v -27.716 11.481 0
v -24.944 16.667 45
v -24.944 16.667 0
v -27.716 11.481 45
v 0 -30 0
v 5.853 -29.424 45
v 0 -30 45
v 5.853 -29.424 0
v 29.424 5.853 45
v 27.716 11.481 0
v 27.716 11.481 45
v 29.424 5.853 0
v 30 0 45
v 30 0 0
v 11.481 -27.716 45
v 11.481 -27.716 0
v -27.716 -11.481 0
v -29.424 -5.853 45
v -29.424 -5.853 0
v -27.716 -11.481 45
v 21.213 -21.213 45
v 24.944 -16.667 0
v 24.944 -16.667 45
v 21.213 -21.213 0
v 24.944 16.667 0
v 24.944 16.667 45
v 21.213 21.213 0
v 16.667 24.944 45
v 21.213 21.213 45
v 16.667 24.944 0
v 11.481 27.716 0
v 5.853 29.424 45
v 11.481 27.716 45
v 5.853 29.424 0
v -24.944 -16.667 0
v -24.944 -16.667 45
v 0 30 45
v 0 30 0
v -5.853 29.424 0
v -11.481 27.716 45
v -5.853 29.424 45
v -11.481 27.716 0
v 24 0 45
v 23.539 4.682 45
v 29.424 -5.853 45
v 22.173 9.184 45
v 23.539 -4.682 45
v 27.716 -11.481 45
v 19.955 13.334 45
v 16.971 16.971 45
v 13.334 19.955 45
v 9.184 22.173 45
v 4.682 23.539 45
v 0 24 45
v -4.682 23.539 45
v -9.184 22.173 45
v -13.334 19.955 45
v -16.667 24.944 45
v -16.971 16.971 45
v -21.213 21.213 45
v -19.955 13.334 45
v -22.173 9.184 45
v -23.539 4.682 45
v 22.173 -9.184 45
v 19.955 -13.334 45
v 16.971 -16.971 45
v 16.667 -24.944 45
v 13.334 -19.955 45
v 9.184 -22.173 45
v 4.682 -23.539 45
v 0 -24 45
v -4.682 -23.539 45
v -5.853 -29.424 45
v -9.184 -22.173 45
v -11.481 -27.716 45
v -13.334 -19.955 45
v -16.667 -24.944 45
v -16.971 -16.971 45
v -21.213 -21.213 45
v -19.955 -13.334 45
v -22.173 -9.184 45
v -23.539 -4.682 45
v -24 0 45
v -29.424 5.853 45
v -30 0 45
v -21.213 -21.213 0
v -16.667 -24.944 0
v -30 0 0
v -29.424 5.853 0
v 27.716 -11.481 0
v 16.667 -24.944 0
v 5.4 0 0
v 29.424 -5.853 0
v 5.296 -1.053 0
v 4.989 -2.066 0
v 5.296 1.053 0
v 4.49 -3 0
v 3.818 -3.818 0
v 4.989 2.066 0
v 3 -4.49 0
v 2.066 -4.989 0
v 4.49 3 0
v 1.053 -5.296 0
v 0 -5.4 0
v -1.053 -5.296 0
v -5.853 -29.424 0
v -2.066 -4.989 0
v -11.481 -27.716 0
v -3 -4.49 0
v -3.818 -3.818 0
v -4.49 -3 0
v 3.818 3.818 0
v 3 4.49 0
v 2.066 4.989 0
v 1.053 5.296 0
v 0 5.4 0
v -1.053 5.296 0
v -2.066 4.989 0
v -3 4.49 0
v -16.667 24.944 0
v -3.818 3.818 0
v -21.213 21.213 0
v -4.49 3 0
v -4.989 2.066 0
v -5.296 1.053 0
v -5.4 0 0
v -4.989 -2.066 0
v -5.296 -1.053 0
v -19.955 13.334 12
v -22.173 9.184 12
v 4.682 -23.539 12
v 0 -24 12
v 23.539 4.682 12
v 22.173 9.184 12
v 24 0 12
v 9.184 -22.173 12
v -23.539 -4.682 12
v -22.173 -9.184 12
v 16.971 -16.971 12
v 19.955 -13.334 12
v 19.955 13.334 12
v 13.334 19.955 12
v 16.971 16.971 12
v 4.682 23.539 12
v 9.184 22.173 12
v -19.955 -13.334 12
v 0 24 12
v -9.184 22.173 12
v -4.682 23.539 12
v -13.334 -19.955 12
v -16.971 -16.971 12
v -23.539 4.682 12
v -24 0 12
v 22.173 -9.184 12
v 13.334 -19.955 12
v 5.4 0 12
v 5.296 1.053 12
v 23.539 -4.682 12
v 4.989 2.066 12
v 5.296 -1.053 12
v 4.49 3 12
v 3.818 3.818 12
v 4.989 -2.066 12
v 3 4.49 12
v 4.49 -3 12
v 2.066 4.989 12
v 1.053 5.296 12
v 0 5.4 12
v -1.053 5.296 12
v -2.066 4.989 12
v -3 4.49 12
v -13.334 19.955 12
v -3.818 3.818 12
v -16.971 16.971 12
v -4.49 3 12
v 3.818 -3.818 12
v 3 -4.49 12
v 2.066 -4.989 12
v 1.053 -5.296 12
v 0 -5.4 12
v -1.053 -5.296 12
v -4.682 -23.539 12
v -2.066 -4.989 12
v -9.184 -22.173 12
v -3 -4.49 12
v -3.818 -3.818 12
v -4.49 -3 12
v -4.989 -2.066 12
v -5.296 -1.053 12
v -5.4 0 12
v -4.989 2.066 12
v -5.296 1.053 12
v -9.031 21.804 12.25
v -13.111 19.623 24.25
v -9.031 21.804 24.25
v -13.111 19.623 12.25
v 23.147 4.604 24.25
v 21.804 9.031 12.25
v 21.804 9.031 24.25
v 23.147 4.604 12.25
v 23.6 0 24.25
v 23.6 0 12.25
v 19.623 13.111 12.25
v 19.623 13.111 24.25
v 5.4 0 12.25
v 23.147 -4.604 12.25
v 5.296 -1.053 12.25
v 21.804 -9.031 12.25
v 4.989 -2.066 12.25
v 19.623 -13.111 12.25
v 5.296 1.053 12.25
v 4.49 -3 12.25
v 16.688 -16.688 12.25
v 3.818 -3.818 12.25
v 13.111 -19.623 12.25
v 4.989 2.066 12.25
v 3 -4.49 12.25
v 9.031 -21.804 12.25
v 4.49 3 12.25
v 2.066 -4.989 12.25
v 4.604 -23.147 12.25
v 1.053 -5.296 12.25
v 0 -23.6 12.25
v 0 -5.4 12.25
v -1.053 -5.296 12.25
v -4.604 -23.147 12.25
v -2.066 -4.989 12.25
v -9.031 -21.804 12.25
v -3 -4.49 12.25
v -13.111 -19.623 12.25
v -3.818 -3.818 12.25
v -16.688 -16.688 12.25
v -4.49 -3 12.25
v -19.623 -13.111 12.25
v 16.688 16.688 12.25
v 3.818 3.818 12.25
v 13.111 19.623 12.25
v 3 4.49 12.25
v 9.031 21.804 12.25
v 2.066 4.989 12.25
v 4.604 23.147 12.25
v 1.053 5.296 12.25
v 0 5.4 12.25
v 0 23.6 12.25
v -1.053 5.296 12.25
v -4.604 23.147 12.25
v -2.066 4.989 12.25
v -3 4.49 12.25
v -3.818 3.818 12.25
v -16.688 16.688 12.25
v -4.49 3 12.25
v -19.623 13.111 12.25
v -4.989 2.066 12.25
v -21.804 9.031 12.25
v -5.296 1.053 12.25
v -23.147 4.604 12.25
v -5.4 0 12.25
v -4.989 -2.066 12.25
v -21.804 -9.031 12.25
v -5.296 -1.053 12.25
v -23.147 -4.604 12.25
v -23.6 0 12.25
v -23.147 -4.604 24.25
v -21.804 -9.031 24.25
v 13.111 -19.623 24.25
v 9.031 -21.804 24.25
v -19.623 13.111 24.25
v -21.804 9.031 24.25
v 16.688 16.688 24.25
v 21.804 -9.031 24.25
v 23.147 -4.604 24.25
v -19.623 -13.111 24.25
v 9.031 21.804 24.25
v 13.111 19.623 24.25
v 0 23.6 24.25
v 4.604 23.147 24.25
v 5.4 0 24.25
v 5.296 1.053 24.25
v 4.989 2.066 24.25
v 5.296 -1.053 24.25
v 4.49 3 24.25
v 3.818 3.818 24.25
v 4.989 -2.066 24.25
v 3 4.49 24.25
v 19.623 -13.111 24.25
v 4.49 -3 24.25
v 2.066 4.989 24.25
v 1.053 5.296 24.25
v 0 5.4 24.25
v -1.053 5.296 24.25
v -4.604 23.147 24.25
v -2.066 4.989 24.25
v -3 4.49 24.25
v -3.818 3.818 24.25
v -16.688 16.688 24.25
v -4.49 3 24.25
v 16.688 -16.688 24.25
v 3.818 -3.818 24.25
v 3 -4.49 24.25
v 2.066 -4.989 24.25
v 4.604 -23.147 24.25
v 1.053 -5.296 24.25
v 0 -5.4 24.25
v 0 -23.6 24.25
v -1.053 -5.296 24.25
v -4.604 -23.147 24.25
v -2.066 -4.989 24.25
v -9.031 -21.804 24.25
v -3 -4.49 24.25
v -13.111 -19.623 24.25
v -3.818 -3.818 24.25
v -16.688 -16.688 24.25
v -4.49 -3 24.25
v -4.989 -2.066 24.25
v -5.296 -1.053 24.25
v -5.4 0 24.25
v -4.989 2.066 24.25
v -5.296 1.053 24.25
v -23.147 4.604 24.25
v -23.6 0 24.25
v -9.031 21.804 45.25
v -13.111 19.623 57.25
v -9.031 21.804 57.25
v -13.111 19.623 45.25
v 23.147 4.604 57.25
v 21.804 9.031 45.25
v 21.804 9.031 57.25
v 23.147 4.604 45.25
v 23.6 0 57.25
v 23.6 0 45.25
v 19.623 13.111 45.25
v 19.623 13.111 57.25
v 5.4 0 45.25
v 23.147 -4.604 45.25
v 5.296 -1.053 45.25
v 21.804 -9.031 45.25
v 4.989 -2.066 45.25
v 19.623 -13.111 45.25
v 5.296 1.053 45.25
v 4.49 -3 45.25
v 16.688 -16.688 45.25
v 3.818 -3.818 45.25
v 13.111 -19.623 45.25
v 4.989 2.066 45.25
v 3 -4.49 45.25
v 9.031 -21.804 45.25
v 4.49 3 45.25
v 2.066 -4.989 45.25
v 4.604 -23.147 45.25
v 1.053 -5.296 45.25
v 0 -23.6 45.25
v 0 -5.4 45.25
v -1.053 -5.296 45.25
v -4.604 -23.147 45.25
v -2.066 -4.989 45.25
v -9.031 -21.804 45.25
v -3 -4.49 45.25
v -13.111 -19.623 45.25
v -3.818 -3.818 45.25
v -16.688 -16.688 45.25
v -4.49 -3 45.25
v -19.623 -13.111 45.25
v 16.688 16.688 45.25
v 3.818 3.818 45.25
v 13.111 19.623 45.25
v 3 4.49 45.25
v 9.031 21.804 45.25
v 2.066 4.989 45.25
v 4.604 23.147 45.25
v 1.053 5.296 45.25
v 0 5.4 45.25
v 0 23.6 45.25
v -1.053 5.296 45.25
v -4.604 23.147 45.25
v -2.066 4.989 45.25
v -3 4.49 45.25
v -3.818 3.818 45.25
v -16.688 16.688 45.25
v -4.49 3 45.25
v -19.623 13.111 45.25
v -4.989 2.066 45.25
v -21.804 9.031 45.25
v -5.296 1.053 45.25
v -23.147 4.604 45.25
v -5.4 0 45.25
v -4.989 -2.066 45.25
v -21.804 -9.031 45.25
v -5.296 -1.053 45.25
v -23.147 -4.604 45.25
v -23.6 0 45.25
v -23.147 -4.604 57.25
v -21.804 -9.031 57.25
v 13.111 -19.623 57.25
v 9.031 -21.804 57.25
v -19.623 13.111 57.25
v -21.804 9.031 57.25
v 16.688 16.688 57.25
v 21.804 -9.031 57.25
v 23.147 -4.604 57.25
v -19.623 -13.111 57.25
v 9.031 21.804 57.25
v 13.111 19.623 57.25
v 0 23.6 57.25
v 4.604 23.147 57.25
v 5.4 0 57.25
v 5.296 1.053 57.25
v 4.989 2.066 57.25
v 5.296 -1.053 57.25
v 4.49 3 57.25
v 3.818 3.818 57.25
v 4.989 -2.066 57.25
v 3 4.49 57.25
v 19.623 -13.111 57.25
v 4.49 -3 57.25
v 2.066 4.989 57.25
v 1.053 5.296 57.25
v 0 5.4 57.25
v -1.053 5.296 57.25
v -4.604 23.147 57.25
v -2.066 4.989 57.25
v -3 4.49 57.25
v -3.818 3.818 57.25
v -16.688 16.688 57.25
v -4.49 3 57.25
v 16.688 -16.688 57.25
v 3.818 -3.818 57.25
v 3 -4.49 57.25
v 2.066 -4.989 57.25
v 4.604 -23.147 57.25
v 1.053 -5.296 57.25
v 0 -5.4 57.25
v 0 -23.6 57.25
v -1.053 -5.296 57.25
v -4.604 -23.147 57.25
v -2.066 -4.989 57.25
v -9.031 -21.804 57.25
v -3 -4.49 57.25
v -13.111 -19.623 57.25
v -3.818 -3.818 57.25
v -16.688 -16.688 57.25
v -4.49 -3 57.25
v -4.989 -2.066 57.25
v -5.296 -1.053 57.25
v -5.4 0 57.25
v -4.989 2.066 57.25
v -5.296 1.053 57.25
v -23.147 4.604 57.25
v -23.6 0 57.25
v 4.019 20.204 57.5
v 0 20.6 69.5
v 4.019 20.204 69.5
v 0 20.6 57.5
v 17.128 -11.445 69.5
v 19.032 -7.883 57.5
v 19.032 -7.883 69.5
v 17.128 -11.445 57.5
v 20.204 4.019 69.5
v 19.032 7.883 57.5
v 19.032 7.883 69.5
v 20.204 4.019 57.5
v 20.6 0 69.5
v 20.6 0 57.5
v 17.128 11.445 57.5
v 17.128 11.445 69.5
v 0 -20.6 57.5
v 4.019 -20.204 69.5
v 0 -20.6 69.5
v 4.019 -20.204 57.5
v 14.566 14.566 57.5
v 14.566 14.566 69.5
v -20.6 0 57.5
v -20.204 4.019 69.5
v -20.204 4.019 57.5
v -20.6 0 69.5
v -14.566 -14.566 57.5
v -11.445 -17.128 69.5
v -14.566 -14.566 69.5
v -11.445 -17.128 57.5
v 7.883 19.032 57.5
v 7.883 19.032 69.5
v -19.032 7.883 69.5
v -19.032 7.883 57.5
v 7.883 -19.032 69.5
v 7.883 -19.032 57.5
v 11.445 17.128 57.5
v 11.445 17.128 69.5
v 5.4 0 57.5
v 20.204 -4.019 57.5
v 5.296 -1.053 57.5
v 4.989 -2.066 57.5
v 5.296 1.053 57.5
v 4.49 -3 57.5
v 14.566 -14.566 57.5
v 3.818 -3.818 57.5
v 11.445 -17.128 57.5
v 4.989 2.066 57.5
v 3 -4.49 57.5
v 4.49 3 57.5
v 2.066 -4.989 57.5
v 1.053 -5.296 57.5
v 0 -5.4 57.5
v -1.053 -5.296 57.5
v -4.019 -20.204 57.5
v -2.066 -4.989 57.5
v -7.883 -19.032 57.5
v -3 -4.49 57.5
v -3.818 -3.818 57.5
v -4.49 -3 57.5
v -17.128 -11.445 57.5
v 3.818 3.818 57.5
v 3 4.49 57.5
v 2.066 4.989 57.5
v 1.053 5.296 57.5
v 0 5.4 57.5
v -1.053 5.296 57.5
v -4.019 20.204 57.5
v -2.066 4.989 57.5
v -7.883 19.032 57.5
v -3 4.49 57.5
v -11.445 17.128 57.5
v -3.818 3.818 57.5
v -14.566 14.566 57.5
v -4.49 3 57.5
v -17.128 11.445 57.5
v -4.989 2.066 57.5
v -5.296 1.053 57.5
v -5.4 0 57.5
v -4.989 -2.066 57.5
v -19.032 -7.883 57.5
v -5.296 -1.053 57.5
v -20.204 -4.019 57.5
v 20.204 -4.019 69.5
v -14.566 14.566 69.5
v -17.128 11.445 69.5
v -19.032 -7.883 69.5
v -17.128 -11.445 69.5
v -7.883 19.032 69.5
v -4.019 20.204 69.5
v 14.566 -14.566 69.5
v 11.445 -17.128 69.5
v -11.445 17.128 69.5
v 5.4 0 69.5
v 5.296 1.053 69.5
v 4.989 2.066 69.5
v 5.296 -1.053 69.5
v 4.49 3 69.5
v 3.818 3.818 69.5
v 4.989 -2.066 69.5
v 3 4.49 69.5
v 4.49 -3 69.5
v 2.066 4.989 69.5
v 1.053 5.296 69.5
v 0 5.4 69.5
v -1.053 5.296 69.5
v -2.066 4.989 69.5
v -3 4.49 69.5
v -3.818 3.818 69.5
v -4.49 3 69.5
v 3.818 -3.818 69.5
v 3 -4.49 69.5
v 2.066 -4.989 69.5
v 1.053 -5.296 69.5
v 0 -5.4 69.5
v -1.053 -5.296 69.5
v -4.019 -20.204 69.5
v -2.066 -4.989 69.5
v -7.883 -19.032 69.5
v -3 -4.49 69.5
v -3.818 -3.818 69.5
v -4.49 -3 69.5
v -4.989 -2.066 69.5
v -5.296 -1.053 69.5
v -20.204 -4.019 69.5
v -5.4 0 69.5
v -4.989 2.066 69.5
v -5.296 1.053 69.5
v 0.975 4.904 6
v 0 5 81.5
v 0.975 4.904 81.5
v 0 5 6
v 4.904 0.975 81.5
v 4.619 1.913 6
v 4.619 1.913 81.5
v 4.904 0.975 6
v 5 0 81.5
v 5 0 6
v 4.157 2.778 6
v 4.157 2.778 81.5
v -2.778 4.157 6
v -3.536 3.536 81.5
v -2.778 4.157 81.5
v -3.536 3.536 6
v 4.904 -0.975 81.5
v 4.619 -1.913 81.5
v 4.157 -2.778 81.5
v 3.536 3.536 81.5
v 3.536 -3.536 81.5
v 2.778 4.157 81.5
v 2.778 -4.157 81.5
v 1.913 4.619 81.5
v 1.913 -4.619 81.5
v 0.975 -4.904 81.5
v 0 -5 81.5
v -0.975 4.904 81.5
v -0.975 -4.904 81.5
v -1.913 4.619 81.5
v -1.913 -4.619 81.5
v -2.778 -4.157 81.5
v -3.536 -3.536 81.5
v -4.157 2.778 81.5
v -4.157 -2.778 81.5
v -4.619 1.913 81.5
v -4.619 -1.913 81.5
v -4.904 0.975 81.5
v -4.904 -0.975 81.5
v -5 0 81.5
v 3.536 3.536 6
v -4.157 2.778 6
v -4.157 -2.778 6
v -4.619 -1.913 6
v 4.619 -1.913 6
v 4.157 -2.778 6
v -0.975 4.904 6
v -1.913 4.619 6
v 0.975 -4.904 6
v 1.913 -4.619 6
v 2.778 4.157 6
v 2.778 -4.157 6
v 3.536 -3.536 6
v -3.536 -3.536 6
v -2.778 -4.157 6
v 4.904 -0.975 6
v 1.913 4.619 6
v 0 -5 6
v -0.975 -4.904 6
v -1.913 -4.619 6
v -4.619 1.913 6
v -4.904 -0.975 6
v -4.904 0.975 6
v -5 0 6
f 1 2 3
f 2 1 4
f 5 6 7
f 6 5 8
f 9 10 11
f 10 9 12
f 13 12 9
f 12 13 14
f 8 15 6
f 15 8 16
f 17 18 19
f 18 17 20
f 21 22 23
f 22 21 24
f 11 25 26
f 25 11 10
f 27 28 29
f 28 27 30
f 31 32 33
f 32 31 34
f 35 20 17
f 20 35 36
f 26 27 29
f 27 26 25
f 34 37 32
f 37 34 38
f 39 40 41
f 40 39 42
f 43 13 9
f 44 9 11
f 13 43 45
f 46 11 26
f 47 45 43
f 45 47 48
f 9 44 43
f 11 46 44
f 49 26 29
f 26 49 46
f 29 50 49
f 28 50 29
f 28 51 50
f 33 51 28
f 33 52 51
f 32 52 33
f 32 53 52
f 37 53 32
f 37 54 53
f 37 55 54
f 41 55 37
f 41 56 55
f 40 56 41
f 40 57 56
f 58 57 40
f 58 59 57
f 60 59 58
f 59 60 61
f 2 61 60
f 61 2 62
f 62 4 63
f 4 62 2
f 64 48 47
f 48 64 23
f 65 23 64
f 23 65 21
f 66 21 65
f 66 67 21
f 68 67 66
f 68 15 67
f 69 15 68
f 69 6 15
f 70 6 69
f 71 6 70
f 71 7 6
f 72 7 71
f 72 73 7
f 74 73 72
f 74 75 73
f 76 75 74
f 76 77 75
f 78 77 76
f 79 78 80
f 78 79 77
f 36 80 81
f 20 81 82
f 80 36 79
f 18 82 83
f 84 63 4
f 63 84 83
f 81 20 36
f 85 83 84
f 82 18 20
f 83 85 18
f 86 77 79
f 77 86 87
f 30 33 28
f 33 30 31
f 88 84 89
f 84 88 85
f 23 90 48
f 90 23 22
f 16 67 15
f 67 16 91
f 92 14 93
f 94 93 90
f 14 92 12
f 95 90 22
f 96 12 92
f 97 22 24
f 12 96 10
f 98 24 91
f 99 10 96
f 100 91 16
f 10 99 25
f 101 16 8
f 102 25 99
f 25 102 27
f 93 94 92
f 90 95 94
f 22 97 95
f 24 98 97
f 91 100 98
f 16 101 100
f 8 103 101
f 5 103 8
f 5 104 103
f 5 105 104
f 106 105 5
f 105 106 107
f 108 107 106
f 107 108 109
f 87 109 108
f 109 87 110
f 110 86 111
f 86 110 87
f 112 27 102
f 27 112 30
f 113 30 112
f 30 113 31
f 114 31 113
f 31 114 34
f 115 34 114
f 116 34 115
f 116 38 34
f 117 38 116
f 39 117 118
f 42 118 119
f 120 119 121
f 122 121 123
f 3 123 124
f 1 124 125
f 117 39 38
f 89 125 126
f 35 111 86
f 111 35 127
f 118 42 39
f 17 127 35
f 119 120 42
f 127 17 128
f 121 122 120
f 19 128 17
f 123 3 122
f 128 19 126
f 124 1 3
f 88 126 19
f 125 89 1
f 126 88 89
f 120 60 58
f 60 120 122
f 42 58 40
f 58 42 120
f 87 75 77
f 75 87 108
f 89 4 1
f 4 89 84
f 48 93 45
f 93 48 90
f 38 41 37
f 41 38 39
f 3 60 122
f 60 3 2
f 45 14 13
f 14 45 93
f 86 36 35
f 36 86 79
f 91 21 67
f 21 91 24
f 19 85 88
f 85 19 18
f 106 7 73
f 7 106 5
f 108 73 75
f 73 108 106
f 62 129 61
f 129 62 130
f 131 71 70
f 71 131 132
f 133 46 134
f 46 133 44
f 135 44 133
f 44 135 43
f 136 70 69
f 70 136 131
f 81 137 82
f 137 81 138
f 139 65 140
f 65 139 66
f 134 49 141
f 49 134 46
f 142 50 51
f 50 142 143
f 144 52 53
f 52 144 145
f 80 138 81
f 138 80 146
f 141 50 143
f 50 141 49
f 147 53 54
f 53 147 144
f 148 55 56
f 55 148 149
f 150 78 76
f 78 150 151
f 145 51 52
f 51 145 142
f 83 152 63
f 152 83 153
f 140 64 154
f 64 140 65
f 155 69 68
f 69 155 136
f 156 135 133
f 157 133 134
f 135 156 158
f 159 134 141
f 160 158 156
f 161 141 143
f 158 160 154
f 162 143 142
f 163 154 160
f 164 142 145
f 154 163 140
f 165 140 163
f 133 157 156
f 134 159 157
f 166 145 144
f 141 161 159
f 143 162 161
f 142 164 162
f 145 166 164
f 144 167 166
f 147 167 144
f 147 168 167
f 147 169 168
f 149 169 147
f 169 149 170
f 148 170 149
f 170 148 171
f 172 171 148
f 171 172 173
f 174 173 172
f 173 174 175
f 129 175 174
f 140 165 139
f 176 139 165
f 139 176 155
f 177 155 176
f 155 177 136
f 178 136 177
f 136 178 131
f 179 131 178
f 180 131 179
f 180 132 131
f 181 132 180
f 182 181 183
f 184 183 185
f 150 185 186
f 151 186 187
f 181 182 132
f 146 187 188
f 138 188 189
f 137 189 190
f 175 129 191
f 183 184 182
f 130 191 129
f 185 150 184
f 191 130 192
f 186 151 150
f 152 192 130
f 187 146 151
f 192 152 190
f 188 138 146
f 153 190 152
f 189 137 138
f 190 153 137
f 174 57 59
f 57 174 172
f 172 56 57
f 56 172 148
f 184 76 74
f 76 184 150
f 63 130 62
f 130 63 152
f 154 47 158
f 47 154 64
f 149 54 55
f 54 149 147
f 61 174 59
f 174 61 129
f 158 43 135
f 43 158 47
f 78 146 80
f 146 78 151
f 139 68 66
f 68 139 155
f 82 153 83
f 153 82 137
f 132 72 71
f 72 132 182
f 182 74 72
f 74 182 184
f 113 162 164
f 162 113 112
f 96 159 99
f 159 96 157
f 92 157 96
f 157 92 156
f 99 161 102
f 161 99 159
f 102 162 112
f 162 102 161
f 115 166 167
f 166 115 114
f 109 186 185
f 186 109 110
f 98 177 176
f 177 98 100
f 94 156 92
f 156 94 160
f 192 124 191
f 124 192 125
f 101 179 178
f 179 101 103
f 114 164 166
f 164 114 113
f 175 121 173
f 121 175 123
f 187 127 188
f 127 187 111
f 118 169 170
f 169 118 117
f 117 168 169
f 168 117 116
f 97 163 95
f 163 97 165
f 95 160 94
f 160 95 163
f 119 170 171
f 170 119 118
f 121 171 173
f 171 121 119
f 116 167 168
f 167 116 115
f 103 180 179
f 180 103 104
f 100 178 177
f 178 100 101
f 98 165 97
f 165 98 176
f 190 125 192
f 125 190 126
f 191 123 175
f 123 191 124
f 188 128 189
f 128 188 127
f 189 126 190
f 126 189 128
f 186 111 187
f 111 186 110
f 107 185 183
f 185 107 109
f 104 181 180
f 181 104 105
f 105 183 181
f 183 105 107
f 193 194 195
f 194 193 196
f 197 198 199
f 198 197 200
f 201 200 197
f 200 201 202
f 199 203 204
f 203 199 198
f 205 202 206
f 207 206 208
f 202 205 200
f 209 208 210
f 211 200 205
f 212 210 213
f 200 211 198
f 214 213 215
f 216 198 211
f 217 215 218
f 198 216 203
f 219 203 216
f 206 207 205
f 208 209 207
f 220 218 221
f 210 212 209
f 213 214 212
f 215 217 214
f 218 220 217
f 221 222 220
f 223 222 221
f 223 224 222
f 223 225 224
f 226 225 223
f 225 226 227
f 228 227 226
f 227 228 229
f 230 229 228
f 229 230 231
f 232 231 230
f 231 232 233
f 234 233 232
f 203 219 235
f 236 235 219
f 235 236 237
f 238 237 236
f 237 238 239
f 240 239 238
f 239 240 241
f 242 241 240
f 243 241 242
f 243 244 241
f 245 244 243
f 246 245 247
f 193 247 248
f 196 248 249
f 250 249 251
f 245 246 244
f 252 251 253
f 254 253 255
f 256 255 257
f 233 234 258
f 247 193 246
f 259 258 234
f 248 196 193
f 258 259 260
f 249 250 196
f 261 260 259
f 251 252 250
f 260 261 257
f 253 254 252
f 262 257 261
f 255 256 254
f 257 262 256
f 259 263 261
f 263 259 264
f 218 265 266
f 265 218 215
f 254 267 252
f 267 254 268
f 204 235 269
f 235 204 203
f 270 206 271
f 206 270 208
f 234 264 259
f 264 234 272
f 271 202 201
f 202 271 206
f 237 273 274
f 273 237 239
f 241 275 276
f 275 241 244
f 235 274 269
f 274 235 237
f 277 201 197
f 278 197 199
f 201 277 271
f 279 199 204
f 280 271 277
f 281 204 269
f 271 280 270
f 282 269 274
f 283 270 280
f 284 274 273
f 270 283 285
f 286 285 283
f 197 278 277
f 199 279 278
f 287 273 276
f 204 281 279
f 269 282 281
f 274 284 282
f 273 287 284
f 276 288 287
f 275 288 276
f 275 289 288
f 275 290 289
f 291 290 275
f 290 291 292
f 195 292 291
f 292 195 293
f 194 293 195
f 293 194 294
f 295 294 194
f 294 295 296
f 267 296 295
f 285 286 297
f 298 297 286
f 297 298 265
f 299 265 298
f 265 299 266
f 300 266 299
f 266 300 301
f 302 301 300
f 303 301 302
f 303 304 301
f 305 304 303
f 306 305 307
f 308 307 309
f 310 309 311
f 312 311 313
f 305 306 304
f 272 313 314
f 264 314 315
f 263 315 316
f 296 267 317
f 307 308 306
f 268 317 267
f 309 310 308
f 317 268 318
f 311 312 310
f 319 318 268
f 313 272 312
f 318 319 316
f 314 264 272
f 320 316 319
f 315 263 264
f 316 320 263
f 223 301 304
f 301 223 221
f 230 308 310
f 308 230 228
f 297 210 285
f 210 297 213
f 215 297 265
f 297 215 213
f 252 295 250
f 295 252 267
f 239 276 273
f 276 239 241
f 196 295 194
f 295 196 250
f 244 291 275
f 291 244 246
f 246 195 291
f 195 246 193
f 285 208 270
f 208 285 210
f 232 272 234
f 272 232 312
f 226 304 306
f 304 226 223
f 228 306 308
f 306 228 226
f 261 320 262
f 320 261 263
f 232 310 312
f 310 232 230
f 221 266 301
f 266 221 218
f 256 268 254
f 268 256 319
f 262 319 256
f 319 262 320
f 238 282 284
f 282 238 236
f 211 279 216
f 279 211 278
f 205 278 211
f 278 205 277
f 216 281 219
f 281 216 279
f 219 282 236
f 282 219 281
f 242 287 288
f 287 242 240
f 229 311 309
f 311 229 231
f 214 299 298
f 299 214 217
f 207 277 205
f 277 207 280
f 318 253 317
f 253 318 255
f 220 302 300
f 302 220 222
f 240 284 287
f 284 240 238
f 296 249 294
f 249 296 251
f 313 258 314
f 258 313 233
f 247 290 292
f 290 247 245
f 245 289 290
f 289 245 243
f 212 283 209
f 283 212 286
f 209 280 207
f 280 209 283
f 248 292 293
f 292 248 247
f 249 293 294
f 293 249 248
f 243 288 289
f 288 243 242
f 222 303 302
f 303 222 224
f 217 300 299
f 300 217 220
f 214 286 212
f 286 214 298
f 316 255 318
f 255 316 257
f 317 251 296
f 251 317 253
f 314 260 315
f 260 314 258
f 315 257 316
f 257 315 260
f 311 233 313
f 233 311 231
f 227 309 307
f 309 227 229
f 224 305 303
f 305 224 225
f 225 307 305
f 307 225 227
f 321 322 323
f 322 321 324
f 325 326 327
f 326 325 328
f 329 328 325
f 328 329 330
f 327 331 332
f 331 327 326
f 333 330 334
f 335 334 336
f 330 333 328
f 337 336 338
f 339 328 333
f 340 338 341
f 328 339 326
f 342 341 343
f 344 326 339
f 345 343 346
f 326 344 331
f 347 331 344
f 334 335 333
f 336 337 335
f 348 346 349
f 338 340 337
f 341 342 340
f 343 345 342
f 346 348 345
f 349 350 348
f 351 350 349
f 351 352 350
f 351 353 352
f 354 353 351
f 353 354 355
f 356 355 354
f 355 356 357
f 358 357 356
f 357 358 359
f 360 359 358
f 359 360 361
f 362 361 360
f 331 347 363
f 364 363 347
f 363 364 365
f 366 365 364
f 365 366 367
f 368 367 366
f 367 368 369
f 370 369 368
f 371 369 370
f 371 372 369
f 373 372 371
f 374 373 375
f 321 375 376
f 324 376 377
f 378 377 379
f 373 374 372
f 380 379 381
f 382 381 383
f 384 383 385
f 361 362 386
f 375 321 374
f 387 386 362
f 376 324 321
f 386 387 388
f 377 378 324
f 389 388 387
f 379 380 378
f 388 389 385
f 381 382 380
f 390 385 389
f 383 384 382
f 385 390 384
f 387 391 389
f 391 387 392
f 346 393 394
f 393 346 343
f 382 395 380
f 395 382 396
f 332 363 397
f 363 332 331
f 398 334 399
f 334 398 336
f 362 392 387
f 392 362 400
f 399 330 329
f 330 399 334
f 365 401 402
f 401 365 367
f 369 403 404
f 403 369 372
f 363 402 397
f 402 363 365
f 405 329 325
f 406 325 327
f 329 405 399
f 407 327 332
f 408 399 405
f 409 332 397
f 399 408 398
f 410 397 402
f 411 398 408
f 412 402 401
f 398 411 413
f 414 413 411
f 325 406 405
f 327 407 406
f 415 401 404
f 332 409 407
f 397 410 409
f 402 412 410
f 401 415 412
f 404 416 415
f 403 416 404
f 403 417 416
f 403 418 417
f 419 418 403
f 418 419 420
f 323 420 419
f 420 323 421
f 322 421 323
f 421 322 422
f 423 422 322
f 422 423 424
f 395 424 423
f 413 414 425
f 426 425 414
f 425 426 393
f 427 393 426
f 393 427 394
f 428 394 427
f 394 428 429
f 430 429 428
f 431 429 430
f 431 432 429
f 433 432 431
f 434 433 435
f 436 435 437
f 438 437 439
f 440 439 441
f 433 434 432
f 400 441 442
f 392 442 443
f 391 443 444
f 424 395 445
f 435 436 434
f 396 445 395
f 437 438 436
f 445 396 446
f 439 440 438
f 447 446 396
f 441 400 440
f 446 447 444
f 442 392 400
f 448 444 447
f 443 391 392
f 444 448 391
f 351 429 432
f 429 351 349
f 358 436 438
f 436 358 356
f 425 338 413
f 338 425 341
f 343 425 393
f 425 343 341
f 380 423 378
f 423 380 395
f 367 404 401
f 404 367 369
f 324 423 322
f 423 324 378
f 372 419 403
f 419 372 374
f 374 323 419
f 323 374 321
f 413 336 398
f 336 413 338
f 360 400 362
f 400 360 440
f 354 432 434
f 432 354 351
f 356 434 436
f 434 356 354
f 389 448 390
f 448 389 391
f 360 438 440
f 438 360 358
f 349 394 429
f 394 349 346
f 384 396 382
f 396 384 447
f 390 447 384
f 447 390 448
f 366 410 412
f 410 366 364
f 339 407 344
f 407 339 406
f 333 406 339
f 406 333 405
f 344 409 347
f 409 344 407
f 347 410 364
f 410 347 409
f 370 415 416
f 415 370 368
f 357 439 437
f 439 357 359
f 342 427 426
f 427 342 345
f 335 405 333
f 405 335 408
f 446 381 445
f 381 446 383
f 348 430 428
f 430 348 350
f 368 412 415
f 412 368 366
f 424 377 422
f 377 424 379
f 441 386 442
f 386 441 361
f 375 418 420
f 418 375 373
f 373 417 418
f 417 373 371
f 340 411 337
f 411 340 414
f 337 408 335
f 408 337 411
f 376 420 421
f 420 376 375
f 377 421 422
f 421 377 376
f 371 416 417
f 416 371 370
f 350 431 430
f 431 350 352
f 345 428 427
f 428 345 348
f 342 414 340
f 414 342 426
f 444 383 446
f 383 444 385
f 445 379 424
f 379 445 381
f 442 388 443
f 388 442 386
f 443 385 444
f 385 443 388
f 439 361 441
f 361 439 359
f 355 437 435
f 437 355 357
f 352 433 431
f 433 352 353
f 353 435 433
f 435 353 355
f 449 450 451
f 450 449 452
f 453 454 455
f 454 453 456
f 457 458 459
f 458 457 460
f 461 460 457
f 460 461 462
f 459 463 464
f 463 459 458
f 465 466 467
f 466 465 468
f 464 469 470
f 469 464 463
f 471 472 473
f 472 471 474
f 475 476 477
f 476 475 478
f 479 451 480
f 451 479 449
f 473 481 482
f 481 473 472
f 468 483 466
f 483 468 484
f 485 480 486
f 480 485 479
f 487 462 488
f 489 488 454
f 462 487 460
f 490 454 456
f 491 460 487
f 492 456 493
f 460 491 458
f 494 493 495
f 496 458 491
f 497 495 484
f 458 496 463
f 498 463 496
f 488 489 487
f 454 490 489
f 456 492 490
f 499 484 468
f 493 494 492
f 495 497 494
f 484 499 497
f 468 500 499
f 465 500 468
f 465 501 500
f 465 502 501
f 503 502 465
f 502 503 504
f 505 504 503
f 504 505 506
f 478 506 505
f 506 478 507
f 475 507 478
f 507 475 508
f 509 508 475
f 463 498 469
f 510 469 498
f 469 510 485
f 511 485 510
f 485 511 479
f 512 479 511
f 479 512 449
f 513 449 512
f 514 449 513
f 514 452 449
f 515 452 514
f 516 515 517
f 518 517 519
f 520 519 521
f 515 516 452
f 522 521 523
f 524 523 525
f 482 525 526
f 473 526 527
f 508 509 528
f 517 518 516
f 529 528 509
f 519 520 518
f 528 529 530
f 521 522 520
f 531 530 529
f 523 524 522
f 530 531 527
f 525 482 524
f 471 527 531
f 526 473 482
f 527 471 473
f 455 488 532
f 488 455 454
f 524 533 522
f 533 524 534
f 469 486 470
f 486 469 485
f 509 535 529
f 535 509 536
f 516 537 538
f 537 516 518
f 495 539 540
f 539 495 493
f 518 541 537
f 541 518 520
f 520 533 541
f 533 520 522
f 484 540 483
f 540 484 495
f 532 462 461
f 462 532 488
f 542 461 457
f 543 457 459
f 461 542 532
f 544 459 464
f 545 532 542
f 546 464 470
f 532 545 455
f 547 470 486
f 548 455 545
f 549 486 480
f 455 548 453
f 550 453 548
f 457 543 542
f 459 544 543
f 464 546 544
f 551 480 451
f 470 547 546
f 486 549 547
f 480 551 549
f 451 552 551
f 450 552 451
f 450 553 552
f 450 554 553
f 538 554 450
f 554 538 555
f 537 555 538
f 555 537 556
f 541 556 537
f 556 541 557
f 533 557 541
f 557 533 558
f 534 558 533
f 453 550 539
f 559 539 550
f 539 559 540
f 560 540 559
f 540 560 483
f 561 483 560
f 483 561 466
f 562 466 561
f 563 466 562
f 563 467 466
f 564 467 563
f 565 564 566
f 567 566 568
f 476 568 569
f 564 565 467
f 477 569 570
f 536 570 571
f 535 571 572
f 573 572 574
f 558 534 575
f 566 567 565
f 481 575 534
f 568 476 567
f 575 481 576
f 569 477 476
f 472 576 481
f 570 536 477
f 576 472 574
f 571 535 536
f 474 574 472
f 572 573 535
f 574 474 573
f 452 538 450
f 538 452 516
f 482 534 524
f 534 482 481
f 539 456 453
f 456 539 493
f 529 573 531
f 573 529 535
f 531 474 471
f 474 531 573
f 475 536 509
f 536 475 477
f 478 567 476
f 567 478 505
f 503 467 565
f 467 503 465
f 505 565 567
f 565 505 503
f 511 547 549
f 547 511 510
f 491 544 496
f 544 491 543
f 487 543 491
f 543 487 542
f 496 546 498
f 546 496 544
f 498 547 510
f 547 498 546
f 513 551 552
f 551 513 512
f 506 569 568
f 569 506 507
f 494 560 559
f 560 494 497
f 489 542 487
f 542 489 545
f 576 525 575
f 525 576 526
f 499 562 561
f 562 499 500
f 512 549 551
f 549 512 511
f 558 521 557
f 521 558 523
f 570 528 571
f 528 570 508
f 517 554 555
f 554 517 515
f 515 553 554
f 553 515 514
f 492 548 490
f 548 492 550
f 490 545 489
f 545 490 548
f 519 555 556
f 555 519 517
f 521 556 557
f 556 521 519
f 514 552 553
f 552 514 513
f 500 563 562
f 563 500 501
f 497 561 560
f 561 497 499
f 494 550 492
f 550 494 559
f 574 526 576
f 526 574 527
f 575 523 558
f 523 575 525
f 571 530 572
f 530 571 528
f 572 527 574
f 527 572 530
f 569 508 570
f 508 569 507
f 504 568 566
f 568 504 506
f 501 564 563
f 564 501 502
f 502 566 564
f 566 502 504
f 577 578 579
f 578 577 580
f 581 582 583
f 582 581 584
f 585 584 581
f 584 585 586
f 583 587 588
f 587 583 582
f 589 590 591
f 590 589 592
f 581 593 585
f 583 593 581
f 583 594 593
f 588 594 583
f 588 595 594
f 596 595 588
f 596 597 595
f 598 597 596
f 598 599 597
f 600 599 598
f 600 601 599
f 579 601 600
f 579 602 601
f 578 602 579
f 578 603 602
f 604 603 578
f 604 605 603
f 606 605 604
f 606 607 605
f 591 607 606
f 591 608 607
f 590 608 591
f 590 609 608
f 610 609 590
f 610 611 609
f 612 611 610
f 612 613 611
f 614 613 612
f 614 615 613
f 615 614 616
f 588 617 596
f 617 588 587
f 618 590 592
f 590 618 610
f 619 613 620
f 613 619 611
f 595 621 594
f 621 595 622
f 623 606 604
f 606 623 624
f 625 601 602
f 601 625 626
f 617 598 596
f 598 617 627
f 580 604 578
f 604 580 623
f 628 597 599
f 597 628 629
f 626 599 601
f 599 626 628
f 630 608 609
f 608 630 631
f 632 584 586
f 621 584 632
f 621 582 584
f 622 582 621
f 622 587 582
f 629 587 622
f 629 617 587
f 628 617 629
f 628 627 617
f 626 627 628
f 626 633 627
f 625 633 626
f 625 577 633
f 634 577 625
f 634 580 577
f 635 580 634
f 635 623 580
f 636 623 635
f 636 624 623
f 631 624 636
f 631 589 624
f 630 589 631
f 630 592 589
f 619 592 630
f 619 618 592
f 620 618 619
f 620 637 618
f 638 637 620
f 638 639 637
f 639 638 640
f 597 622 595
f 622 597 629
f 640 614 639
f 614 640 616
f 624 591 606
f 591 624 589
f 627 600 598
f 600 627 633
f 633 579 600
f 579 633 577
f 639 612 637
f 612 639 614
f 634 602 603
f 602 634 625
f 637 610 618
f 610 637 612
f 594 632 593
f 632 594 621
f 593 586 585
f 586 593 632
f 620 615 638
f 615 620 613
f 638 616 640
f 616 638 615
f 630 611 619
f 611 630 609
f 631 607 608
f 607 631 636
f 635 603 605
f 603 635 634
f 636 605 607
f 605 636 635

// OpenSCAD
$fn = 32;

// ------------------------------------------------------------------------
// Bearing housing: housing d60, two bearings and a shaft
// Every part is its own module, assembly() places them once.
// ------------------------------------------------------------------------

// --- part 1 ---
module housing() {
  difference() {
    cylinder(h = 45, d = 60);
    translate([0, 0, 12]) cylinder(h = 34, d = 48);
    translate([0, 0, -1]) cylinder(h = 14, d = 10.8);
  }
}

// --- part 2 ---
module bearing_lower() {
  difference() {
      translate([0, 0, 0]) cylinder(h = 12, d = 47.2);
      translate([0, 0, -1]) cylinder(h = 14, d = 10.8);
    }
}

// --- part 3 ---
module bearing_upper() {
  difference() {
      translate([0, 0, 0]) cylinder(h = 12, d = 47.2);
      translate([0, 0, -1]) cylinder(h = 14, d = 10.8);
    }
}

// --- part 4 ---
module spacer() {
  difference() {
      translate([0, 0, 0]) cylinder(h = 12, d = 41.2);
      translate([0, 0, -1]) cylinder(h = 14, d = 10.8);
    }
}

// --- part 5 ---
module shaft() {
  translate([0, 0, -37.75]) cylinder(h = 75.5, d = 10);
}

// --- assembly ---
module assembly() {
  translate([0, 0, 0]) rotate([0, 0, 0]) housing();
  translate([0, 0, 12.25]) rotate([0, 0, 0]) bearing_lower();
  translate([0, 0, 45.25]) rotate([0, 0, 0]) bearing_upper();
  translate([0, 0, 57.5]) rotate([0, 0, 0]) spacer();
  translate([0, 0, 43.75]) rotate([0, 0, 0]) shaft();
}

assembly();
